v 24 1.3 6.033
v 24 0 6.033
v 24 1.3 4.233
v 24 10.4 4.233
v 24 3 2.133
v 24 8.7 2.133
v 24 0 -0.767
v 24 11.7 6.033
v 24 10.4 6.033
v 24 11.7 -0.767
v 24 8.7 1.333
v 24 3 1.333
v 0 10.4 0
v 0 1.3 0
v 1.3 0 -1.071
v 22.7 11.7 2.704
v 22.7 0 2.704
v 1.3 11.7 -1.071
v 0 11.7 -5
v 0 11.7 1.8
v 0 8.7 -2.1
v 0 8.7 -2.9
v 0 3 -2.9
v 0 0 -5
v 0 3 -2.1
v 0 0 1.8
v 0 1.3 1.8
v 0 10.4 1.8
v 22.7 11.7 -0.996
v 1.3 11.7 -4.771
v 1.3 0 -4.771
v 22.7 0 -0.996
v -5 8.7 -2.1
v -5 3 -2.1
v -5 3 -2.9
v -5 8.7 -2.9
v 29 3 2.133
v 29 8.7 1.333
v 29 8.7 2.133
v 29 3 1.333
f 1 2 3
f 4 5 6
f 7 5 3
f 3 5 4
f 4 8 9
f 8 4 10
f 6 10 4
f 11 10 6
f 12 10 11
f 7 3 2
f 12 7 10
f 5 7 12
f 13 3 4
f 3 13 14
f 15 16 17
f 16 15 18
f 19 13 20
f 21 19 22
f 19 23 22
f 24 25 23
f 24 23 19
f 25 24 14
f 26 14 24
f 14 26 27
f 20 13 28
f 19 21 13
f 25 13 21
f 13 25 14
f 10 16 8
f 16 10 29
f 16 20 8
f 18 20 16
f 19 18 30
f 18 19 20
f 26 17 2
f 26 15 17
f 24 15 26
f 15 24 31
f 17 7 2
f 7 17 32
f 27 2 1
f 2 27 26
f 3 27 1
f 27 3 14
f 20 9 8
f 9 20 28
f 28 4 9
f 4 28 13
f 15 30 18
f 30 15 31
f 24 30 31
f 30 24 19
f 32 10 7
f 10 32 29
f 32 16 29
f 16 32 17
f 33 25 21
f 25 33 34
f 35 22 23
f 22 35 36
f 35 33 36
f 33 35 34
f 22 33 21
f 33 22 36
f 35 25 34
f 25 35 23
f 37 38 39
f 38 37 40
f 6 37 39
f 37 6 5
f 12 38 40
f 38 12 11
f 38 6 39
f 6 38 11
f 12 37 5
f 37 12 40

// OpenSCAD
WS = 0.3;   // pixel to mm
TH = 1.3 / WS;   // minimum thickness

l1 = 128.36;
l2 = 142.47;
w = 39;
d = 80;
h = abs(l2 - l1);
cw = max(w - 6 / WS, 4 / WS);
cl = 5 / WS;

scale([WS, WS, WS]) {
  multmatrix([
    [1, 0, 0, 0],
    [0, 1, 0, 0],
    [(l2 - l1) / d, 0, 1, 0],
    [0, 0, 0, 1]
  ]) {
    translate([0, 0, -TH]) cube([d, w, TH]);
    cube([d, TH, 6]);
    translate([0, w - TH, 0]) cube([d, TH, 6]);
    translate([0, 0, -5 / WS]) cube([TH, w, 5 / WS]);
    translate([d - TH, 0, -5 / WS]) cube([TH, w, 5 / WS]);
  }
  translate([-cl, (w - cw) / 2, -(5 + 0.8) / 2 / WS]) cube([cl, cw, 0.8 / WS]);
  translate([d, (w - cw) / 2, l2-l1-(5 + 0.8) / 2 / WS]) cube([cl, cw, 0.8 / WS]);
}
